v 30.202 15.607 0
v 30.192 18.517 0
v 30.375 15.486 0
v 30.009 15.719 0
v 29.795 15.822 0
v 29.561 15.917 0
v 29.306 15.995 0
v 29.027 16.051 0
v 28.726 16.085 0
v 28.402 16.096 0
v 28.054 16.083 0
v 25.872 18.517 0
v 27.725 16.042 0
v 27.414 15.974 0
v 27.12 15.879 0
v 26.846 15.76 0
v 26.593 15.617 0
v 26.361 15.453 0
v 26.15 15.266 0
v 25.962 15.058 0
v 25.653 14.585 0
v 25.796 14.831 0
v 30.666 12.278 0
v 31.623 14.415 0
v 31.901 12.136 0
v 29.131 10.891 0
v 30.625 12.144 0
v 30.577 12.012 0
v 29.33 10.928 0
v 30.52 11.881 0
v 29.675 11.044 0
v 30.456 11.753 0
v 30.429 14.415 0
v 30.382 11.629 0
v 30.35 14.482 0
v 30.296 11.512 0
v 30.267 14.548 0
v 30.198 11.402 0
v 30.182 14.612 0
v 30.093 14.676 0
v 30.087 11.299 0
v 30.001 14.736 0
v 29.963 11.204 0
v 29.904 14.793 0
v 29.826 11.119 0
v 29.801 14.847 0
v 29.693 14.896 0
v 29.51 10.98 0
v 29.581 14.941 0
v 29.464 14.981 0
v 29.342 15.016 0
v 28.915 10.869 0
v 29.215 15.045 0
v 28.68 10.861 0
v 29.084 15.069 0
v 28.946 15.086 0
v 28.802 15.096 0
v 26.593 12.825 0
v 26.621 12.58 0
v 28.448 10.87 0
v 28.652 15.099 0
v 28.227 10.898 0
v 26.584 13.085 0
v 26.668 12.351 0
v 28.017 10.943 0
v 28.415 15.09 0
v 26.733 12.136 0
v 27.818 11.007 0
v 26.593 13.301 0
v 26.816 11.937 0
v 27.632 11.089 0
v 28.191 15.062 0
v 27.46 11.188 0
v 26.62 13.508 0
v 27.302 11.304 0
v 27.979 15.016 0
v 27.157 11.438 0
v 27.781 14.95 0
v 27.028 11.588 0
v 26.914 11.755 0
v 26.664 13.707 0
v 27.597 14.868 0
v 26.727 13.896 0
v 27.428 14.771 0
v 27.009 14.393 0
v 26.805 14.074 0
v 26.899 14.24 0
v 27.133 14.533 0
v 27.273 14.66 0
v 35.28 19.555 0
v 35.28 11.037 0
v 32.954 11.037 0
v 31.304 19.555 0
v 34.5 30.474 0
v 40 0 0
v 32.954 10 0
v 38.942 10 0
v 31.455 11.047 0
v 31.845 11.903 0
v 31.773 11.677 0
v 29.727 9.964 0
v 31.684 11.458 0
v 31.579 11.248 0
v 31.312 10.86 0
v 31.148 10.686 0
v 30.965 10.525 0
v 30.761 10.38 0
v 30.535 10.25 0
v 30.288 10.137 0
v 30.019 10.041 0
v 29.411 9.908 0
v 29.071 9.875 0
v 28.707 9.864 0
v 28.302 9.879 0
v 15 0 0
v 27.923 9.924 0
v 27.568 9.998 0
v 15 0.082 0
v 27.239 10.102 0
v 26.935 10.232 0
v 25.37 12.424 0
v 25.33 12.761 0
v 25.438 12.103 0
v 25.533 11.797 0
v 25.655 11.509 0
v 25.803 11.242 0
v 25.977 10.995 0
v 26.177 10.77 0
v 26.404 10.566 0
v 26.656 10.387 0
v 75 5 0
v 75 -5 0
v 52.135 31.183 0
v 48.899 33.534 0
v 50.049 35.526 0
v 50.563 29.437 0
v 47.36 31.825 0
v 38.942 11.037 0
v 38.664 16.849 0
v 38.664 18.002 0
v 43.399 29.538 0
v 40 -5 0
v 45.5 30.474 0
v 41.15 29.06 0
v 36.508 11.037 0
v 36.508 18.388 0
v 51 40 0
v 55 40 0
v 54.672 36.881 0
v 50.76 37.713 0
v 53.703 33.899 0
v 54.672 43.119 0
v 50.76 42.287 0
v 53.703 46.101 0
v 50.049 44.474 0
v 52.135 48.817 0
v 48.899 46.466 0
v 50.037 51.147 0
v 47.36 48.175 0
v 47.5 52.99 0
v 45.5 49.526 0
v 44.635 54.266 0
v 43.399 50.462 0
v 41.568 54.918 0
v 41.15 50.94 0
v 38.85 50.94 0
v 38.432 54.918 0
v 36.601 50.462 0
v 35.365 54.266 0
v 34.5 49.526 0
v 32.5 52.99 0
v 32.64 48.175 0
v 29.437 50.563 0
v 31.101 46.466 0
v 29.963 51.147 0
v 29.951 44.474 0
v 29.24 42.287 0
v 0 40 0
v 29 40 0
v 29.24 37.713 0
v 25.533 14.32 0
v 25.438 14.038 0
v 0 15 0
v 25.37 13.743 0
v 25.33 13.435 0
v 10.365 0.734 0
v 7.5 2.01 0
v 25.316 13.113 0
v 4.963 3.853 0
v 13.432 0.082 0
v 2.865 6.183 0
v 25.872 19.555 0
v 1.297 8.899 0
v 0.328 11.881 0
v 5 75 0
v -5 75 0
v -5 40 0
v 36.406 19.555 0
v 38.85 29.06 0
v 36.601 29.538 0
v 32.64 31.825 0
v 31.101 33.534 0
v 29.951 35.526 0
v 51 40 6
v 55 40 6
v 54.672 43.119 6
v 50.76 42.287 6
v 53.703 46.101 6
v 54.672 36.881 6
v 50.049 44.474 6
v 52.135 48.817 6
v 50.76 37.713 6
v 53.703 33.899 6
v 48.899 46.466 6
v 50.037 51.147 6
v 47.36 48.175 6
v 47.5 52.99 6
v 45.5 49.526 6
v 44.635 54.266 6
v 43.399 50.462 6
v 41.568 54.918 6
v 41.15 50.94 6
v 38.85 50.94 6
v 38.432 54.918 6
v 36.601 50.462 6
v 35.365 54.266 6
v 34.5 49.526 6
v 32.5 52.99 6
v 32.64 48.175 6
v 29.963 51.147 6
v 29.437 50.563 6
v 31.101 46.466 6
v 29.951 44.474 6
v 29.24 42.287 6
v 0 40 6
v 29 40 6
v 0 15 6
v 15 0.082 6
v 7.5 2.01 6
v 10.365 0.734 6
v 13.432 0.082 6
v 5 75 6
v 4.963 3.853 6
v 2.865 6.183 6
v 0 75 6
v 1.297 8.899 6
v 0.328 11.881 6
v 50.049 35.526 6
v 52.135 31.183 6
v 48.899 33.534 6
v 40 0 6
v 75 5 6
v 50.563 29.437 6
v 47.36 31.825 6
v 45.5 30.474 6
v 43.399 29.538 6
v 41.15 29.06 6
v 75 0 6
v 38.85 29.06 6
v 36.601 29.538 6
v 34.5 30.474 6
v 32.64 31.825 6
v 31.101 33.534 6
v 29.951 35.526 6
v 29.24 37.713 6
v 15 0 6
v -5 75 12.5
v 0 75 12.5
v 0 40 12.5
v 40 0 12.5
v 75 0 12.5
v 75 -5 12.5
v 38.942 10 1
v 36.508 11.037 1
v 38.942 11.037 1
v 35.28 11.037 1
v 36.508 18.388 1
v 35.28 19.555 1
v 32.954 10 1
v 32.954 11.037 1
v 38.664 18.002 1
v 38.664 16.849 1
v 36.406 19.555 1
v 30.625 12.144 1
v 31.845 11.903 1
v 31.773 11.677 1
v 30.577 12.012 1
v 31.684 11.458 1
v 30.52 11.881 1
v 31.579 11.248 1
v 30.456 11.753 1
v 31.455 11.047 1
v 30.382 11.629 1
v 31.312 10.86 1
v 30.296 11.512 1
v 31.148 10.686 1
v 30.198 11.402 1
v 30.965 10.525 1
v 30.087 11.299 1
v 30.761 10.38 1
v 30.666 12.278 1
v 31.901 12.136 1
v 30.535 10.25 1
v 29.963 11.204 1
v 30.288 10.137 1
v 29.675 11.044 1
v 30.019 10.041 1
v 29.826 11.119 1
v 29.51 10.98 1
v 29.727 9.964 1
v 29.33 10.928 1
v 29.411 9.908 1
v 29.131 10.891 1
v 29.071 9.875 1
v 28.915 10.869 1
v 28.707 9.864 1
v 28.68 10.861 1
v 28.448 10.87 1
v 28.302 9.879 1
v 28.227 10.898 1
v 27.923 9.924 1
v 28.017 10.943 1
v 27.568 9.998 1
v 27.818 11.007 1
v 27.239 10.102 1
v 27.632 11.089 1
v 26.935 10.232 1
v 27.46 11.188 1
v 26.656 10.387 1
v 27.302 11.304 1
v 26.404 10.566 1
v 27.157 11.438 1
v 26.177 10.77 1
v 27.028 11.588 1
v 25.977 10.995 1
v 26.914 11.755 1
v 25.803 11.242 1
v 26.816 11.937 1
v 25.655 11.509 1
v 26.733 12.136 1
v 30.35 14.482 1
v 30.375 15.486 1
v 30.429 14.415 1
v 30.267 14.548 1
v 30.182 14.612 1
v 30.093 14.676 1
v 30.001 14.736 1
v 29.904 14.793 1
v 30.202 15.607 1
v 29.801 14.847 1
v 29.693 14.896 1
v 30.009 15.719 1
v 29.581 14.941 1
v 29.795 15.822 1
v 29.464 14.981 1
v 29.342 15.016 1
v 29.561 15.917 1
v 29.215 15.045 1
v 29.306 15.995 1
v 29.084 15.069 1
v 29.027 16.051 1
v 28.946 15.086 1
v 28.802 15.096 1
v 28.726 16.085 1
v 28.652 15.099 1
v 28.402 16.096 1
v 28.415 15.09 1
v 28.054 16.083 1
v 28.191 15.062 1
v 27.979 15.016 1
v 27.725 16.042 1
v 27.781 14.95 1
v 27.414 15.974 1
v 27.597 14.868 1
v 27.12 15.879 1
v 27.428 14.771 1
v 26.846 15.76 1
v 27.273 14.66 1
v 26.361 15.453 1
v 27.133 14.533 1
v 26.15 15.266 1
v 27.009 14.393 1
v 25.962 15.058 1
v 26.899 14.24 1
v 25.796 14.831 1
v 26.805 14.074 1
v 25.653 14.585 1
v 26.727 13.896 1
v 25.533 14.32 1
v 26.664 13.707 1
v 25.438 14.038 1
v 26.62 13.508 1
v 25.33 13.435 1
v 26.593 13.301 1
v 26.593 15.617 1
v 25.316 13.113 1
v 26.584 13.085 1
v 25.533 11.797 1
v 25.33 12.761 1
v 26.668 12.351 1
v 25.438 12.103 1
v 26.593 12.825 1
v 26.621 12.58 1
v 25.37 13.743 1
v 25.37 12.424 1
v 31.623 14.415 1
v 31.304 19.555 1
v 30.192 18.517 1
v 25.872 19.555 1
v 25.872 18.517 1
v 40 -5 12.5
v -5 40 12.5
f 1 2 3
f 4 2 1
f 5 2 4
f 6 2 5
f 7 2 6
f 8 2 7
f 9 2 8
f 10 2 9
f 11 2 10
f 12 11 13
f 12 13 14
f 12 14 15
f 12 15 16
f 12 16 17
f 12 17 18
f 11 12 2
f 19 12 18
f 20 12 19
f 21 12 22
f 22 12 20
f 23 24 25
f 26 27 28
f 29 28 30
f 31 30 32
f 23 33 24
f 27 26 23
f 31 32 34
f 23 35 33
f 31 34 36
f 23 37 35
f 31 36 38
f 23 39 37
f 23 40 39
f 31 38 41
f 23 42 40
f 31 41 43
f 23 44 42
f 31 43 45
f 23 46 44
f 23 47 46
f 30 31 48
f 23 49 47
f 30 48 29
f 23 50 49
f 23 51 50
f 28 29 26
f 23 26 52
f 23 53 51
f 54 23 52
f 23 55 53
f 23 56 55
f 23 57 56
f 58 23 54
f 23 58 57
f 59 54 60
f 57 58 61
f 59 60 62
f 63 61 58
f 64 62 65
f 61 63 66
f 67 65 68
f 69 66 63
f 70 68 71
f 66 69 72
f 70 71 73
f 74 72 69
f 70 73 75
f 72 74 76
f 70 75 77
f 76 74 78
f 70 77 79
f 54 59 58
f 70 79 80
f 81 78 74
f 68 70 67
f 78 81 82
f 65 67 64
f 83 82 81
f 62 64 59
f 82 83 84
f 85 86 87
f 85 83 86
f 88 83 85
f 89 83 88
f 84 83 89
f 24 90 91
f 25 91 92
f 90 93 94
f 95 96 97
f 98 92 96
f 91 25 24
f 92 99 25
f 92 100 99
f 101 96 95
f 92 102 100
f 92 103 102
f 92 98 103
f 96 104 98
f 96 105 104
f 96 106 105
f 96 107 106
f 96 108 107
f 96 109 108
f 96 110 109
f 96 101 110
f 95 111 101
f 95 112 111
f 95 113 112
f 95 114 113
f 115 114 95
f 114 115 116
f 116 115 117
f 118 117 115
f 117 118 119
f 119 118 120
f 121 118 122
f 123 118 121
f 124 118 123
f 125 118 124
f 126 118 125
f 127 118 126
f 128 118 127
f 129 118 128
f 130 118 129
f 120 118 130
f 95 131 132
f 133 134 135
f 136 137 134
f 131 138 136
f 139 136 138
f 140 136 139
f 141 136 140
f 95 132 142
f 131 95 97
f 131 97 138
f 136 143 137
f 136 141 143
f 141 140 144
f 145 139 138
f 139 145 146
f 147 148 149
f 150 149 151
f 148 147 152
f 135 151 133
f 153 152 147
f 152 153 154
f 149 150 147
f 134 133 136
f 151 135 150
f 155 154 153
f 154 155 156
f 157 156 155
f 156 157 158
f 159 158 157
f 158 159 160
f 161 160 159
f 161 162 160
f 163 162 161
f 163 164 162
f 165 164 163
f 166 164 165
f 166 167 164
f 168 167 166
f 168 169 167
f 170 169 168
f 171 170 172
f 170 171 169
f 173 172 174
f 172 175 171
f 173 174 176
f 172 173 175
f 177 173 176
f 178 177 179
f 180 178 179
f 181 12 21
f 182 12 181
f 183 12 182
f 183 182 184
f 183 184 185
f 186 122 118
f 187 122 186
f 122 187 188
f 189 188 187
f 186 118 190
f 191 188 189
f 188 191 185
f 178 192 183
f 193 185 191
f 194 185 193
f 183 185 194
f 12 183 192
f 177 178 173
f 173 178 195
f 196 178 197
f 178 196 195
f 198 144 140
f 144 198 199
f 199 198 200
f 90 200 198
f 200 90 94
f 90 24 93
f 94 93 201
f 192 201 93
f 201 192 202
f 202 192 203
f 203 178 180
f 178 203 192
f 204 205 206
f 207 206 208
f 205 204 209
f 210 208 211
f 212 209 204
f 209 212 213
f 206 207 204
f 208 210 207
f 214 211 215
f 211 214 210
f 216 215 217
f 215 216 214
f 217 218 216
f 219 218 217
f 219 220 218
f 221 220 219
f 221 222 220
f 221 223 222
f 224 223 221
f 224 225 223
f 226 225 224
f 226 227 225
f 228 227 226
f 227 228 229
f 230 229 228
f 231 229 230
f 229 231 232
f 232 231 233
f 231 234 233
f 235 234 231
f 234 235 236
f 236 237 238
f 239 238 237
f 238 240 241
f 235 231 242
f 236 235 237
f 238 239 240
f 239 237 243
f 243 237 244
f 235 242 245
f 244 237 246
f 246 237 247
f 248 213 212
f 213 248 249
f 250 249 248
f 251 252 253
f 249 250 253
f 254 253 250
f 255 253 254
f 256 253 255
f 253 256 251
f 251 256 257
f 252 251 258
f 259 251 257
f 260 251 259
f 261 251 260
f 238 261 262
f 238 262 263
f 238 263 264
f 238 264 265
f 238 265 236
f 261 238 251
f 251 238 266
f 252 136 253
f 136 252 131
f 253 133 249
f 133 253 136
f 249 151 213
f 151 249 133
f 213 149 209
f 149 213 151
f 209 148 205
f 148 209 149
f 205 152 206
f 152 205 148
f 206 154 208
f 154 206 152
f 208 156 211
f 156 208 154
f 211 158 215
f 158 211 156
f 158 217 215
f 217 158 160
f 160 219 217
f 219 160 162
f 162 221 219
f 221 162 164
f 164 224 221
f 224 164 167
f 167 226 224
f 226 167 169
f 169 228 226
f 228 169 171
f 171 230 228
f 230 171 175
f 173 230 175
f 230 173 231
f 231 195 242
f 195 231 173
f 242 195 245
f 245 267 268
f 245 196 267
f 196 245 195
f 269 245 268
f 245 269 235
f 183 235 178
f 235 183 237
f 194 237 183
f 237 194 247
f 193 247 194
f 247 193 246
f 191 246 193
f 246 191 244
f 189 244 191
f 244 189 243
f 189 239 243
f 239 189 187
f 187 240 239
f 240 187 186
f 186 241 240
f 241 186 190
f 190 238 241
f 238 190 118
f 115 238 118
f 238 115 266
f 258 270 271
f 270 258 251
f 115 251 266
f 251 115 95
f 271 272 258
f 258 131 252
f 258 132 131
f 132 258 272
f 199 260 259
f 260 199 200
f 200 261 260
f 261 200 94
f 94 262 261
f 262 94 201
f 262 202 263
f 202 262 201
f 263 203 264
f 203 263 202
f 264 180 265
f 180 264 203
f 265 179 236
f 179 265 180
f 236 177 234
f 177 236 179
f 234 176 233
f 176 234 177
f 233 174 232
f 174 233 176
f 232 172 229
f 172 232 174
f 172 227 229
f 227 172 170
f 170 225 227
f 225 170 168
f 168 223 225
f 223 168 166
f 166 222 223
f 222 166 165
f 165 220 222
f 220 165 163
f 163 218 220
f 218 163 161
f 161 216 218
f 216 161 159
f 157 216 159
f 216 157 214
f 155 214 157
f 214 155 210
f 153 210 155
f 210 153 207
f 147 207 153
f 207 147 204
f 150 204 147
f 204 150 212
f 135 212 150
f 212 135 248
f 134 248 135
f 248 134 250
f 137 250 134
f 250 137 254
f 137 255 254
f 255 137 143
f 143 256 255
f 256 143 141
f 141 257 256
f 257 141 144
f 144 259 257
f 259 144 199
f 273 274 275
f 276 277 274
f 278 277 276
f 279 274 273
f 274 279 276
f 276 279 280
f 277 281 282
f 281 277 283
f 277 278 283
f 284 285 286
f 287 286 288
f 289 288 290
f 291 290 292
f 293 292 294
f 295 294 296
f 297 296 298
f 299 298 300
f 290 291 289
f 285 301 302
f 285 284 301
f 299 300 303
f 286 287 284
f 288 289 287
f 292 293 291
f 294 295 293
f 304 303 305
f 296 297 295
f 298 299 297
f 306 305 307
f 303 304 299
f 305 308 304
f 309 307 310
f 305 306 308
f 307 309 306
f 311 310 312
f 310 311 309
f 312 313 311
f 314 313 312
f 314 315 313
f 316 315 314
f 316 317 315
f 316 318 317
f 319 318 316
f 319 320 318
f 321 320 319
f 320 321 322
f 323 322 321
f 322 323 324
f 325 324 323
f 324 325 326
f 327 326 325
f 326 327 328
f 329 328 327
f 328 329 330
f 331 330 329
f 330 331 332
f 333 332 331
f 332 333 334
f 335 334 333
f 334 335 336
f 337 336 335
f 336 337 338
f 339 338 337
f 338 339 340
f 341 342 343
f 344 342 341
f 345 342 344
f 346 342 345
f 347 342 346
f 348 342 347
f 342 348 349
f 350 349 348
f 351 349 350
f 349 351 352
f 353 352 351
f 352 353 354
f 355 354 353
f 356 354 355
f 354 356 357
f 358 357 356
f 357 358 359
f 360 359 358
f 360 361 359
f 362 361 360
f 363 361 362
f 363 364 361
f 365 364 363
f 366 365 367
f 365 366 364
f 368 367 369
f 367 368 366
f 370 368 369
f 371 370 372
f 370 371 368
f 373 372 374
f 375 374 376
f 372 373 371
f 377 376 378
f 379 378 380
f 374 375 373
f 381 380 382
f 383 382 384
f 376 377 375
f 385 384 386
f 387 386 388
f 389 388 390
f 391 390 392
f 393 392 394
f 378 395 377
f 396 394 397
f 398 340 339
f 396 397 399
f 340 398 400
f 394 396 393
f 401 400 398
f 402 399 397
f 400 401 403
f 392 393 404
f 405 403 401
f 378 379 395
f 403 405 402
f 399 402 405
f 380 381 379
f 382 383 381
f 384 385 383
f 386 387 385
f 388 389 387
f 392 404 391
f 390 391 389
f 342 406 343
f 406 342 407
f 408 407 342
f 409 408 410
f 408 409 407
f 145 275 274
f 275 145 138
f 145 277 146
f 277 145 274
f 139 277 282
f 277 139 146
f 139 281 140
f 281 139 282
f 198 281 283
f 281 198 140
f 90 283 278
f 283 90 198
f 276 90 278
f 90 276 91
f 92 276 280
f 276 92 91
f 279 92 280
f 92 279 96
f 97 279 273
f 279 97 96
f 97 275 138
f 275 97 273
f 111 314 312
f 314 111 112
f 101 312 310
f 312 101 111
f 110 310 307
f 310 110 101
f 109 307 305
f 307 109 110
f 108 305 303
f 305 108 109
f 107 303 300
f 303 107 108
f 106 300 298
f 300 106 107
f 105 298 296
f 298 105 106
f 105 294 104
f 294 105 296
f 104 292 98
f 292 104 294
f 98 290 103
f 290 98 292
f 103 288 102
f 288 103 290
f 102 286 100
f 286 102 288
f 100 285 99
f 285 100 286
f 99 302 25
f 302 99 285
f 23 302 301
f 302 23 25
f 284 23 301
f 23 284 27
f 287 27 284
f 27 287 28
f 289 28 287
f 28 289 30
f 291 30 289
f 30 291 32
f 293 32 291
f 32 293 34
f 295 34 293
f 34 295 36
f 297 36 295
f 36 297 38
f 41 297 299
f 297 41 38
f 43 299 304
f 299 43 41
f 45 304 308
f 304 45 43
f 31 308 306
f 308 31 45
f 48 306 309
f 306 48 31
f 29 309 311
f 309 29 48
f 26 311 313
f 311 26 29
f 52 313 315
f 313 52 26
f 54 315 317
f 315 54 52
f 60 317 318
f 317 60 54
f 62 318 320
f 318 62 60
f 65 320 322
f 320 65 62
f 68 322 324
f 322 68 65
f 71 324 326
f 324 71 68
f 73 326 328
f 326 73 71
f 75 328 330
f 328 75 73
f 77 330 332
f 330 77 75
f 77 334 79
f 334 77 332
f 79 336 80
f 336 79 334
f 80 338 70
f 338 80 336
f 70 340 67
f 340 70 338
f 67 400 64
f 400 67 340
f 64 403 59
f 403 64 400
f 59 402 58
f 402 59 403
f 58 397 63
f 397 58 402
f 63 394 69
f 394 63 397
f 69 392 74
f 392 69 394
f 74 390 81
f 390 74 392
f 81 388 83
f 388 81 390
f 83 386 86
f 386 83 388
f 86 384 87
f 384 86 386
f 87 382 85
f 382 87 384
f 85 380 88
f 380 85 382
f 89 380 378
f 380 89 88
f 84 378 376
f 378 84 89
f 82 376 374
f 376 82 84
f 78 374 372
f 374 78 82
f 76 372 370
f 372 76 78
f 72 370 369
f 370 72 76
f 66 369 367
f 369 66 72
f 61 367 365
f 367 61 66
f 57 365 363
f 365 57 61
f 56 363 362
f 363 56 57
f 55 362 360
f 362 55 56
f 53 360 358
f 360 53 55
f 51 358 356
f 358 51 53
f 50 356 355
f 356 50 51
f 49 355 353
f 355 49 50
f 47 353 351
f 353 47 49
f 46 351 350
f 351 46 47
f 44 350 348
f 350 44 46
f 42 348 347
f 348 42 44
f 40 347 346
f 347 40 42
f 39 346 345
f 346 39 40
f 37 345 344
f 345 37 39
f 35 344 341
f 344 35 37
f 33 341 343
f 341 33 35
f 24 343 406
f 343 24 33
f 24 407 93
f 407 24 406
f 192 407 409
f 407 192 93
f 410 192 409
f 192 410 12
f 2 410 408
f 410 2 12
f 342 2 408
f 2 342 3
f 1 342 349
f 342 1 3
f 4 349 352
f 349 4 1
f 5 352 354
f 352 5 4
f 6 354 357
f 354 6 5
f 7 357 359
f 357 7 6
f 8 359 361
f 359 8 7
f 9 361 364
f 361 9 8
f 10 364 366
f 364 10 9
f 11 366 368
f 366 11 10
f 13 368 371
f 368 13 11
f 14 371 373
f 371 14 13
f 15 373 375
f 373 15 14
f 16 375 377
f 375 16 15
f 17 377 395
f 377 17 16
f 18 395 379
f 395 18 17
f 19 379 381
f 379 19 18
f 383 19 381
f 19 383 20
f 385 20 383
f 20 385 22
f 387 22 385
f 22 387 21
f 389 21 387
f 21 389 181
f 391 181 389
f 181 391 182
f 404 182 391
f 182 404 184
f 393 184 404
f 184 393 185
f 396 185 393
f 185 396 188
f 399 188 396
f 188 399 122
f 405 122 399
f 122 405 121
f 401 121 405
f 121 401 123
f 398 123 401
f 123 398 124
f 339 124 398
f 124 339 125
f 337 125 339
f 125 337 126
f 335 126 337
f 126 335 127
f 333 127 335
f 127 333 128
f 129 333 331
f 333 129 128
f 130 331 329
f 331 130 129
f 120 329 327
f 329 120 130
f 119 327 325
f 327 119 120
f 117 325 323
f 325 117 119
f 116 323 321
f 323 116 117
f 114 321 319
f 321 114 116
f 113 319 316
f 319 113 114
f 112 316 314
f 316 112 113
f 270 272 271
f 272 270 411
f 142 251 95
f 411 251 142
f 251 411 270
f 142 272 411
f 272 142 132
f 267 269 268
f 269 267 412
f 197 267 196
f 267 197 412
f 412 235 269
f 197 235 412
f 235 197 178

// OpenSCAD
radius=15;

difference(){
    linear_extrude(6){
        difference(){
            union(){
                translate([40,40,0])circle(15);
                difference(){
                    polygon([[0,0],[75,0],[75,5],[5,75],[0,75]]);
                    difference(){
                        square(radius);
                        translate([radius,radius,0])circle(radius);
                    }
                }
            }
            translate([40,40,0])circle(11);
            
        }
    };
    linear_extrude(1)translate([40,10])mirror([1,0,0])text(str(radius));
}
translate([40,-5,0])cube([35,5,12.5]);
translate([-5,40,0])cube([5,35,12.5]);
